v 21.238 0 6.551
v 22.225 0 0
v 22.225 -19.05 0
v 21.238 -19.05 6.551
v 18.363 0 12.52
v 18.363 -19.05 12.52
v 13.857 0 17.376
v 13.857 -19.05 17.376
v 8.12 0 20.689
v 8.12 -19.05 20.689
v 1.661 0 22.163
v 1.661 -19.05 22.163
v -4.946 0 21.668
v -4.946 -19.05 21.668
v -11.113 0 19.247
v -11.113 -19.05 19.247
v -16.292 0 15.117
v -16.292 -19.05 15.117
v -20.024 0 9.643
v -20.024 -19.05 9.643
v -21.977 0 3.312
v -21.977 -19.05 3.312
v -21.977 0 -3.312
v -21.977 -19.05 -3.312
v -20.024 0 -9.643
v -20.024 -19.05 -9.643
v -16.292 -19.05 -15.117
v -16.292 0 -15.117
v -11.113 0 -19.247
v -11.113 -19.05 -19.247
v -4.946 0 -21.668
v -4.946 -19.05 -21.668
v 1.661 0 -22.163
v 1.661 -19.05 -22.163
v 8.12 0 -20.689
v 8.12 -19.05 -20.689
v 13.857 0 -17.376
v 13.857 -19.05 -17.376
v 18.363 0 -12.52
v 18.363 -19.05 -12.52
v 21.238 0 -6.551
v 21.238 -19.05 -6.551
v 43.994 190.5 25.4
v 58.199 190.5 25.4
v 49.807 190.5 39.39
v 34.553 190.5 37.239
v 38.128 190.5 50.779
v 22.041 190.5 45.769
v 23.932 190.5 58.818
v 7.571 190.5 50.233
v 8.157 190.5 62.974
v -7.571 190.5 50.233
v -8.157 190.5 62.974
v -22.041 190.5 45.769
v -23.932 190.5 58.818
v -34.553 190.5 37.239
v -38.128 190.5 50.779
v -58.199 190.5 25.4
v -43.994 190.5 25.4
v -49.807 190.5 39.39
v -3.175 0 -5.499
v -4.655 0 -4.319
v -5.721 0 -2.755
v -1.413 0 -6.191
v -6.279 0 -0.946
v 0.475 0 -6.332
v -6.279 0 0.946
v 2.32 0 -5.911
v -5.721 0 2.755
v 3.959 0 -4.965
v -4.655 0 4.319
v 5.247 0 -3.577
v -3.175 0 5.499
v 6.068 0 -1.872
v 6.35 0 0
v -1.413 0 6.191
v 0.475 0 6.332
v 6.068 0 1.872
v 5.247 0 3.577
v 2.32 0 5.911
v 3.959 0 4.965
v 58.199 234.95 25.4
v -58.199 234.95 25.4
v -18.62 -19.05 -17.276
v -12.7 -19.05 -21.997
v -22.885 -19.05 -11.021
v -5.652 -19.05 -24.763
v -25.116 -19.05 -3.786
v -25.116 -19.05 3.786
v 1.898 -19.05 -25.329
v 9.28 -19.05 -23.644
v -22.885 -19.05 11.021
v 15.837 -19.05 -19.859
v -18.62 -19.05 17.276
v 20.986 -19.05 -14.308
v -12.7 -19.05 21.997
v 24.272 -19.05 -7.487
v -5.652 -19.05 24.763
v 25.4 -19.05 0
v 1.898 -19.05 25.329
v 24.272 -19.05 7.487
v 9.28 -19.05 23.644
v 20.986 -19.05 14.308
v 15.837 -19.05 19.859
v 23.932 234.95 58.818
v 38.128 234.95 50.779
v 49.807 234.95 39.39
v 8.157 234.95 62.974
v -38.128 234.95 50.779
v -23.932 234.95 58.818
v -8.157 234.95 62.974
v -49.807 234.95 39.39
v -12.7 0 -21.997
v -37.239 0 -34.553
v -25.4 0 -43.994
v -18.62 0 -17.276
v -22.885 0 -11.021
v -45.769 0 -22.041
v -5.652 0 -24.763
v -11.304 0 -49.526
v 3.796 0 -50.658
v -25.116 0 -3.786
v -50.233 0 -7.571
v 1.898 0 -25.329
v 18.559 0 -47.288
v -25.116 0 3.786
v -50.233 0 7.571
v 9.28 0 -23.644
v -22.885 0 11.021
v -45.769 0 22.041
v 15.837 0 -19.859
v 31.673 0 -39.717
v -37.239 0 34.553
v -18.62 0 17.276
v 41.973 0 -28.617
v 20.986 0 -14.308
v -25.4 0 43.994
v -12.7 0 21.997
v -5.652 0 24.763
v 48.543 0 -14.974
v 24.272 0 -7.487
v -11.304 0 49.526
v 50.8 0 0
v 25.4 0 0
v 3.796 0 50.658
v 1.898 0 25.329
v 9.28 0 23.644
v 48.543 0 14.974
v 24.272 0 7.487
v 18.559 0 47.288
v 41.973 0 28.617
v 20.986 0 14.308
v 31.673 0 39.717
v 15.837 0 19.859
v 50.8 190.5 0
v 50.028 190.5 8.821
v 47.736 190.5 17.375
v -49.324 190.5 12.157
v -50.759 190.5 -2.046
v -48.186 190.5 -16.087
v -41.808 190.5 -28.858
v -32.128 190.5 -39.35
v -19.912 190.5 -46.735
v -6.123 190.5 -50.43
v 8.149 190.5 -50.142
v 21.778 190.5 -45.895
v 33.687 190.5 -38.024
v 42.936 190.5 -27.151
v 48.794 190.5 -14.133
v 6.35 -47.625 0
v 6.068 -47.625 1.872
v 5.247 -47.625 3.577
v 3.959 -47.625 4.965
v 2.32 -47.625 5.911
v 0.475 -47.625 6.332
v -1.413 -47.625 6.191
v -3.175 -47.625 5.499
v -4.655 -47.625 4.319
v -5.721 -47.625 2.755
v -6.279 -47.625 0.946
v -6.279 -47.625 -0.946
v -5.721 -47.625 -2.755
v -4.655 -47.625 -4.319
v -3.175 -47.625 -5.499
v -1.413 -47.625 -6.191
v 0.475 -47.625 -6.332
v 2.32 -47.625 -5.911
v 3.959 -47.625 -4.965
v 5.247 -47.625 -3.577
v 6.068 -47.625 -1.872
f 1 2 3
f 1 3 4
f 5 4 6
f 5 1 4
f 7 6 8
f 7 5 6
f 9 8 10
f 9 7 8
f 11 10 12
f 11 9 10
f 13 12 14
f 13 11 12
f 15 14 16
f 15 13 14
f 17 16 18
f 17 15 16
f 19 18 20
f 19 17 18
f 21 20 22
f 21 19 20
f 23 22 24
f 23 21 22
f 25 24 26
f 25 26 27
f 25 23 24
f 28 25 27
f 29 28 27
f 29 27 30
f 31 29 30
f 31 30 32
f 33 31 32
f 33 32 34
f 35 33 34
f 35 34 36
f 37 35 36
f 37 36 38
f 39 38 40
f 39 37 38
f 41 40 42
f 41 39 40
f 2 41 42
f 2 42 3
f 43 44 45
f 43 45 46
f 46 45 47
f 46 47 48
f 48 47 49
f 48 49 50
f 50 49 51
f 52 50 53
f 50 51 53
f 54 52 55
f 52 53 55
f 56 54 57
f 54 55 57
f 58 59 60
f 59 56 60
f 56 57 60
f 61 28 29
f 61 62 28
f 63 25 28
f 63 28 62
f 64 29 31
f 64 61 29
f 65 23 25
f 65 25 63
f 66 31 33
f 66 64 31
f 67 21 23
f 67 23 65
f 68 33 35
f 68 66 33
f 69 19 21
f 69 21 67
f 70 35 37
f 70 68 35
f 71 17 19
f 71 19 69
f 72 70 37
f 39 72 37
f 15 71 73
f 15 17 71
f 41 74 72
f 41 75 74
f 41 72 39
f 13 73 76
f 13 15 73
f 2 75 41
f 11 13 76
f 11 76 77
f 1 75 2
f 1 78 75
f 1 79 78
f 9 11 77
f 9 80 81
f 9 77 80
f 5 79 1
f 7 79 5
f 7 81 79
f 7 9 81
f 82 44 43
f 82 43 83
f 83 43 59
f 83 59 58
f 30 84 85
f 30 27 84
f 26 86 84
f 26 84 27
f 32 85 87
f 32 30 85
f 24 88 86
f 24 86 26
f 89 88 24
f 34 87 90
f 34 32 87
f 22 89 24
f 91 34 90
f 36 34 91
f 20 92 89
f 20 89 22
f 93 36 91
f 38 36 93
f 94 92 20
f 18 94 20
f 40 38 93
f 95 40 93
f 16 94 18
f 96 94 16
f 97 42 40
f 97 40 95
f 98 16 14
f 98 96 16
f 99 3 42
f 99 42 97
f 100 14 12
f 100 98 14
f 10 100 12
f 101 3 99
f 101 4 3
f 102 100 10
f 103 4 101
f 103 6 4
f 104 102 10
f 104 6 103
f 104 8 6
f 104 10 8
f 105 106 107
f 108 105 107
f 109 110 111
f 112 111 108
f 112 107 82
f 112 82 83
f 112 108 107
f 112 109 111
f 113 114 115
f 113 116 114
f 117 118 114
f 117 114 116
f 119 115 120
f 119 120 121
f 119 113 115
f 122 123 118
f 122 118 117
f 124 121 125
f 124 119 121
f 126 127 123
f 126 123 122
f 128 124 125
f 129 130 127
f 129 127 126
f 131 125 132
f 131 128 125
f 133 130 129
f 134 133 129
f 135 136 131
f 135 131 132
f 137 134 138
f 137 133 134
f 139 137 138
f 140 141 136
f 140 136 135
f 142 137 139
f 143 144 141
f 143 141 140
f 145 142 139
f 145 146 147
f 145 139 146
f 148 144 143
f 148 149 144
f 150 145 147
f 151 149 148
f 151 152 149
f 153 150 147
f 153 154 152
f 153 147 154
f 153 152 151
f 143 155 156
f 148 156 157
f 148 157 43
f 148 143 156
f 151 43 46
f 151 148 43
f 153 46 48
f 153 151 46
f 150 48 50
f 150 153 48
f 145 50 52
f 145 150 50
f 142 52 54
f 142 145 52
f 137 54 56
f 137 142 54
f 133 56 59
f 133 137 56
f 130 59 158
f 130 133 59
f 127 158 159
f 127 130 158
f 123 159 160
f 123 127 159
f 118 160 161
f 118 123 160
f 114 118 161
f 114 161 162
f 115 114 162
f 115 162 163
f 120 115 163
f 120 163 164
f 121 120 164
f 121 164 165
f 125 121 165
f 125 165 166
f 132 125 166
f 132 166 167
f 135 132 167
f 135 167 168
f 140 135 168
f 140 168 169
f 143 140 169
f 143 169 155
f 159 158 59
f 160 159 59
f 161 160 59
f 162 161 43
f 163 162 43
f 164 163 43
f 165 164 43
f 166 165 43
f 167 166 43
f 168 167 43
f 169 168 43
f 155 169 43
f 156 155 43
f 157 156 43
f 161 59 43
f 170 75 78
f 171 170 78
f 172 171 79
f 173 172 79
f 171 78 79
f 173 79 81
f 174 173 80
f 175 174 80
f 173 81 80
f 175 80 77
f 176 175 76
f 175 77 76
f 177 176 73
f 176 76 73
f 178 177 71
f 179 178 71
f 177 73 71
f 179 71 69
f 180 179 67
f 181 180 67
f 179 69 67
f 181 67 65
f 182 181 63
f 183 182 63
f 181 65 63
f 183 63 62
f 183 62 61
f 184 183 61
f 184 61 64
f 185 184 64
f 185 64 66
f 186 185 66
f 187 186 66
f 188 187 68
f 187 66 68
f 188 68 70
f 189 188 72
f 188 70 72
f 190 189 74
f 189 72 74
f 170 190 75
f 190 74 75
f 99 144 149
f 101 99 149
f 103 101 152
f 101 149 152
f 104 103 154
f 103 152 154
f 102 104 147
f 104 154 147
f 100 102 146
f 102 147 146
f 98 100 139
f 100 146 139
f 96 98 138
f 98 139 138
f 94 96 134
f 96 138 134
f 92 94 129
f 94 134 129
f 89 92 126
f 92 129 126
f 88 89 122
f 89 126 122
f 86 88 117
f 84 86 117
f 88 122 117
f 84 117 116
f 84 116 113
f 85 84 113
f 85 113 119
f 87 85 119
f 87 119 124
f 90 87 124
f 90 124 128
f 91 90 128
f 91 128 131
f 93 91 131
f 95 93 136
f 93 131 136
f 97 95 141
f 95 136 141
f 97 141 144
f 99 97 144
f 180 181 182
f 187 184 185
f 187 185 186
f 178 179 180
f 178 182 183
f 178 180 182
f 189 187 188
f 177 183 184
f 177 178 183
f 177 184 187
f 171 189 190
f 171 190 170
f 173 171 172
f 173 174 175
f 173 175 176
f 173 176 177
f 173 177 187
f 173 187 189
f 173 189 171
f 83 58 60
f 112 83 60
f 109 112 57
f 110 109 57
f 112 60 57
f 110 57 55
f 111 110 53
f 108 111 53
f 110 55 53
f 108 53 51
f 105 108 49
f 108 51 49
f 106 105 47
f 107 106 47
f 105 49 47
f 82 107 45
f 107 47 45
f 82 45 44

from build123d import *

# Parameters (mm, degrees)
F0_R     = 50.8
F1_DEPTH = 190.5
F2_R     = 6.35
F3_DEPTH = 47.625
F4_R     = 25.4
F4_R_2   = 22.225
F5_DEPTH = 19.05
F7_DEPTH = 44.45


# Not quite as in the source:
# - a feature names something its author has since deleted; it is built from what else it names


with BuildPart() as f1:
    # F0 (on Front) → F1 (new body)
    with BuildSketch(Plane.XZ):
        Circle(F0_R)
    extrude(amount=-F1_DEPTH)

    # F2 (on face) → F3 (join)
    with BuildSketch(Plane.XZ):
        Circle(F2_R)
    extrude(amount=F3_DEPTH)

    # F4 (on face) → F5 (join)
    with BuildSketch(Plane.XZ):
        Circle(F4_R)
        Circle(F4_R_2, mode=Mode.SUBTRACT)
    extrude(amount=F5_DEPTH)

    # F6 (on face) → F7 (join)
    with BuildSketch(Plane(origin=(0, 190.5, 0), x_dir=(-1, 0, 0), z_dir=(0, 1, 0))):
        with BuildLine():
            Line((43.9940905122, 25.4), (58.1987113259, 25.4))
            ThreePointArc((58.1987113259, 25.4), (0, 63.5), (-58.1987113259, 25.4))
            Line((-58.1987113259, 25.4), (-43.9940905122, 25.4))
            ThreePointArc((-43.9940905122, 25.4), (0, 50.8), (43.9940905122, 25.4))
        make_face()
        with BuildLine():
            Line((0, 25.4), (43.9940905122, 25.4))
            ThreePointArc((43.9940905122, 25.4), (0, 50.8), (-43.9940905122, 25.4))
            Line((-43.9940905122, 25.4), (0, 25.4))
        make_face()
    extrude(amount=F7_DEPTH)


solid = f1.part
